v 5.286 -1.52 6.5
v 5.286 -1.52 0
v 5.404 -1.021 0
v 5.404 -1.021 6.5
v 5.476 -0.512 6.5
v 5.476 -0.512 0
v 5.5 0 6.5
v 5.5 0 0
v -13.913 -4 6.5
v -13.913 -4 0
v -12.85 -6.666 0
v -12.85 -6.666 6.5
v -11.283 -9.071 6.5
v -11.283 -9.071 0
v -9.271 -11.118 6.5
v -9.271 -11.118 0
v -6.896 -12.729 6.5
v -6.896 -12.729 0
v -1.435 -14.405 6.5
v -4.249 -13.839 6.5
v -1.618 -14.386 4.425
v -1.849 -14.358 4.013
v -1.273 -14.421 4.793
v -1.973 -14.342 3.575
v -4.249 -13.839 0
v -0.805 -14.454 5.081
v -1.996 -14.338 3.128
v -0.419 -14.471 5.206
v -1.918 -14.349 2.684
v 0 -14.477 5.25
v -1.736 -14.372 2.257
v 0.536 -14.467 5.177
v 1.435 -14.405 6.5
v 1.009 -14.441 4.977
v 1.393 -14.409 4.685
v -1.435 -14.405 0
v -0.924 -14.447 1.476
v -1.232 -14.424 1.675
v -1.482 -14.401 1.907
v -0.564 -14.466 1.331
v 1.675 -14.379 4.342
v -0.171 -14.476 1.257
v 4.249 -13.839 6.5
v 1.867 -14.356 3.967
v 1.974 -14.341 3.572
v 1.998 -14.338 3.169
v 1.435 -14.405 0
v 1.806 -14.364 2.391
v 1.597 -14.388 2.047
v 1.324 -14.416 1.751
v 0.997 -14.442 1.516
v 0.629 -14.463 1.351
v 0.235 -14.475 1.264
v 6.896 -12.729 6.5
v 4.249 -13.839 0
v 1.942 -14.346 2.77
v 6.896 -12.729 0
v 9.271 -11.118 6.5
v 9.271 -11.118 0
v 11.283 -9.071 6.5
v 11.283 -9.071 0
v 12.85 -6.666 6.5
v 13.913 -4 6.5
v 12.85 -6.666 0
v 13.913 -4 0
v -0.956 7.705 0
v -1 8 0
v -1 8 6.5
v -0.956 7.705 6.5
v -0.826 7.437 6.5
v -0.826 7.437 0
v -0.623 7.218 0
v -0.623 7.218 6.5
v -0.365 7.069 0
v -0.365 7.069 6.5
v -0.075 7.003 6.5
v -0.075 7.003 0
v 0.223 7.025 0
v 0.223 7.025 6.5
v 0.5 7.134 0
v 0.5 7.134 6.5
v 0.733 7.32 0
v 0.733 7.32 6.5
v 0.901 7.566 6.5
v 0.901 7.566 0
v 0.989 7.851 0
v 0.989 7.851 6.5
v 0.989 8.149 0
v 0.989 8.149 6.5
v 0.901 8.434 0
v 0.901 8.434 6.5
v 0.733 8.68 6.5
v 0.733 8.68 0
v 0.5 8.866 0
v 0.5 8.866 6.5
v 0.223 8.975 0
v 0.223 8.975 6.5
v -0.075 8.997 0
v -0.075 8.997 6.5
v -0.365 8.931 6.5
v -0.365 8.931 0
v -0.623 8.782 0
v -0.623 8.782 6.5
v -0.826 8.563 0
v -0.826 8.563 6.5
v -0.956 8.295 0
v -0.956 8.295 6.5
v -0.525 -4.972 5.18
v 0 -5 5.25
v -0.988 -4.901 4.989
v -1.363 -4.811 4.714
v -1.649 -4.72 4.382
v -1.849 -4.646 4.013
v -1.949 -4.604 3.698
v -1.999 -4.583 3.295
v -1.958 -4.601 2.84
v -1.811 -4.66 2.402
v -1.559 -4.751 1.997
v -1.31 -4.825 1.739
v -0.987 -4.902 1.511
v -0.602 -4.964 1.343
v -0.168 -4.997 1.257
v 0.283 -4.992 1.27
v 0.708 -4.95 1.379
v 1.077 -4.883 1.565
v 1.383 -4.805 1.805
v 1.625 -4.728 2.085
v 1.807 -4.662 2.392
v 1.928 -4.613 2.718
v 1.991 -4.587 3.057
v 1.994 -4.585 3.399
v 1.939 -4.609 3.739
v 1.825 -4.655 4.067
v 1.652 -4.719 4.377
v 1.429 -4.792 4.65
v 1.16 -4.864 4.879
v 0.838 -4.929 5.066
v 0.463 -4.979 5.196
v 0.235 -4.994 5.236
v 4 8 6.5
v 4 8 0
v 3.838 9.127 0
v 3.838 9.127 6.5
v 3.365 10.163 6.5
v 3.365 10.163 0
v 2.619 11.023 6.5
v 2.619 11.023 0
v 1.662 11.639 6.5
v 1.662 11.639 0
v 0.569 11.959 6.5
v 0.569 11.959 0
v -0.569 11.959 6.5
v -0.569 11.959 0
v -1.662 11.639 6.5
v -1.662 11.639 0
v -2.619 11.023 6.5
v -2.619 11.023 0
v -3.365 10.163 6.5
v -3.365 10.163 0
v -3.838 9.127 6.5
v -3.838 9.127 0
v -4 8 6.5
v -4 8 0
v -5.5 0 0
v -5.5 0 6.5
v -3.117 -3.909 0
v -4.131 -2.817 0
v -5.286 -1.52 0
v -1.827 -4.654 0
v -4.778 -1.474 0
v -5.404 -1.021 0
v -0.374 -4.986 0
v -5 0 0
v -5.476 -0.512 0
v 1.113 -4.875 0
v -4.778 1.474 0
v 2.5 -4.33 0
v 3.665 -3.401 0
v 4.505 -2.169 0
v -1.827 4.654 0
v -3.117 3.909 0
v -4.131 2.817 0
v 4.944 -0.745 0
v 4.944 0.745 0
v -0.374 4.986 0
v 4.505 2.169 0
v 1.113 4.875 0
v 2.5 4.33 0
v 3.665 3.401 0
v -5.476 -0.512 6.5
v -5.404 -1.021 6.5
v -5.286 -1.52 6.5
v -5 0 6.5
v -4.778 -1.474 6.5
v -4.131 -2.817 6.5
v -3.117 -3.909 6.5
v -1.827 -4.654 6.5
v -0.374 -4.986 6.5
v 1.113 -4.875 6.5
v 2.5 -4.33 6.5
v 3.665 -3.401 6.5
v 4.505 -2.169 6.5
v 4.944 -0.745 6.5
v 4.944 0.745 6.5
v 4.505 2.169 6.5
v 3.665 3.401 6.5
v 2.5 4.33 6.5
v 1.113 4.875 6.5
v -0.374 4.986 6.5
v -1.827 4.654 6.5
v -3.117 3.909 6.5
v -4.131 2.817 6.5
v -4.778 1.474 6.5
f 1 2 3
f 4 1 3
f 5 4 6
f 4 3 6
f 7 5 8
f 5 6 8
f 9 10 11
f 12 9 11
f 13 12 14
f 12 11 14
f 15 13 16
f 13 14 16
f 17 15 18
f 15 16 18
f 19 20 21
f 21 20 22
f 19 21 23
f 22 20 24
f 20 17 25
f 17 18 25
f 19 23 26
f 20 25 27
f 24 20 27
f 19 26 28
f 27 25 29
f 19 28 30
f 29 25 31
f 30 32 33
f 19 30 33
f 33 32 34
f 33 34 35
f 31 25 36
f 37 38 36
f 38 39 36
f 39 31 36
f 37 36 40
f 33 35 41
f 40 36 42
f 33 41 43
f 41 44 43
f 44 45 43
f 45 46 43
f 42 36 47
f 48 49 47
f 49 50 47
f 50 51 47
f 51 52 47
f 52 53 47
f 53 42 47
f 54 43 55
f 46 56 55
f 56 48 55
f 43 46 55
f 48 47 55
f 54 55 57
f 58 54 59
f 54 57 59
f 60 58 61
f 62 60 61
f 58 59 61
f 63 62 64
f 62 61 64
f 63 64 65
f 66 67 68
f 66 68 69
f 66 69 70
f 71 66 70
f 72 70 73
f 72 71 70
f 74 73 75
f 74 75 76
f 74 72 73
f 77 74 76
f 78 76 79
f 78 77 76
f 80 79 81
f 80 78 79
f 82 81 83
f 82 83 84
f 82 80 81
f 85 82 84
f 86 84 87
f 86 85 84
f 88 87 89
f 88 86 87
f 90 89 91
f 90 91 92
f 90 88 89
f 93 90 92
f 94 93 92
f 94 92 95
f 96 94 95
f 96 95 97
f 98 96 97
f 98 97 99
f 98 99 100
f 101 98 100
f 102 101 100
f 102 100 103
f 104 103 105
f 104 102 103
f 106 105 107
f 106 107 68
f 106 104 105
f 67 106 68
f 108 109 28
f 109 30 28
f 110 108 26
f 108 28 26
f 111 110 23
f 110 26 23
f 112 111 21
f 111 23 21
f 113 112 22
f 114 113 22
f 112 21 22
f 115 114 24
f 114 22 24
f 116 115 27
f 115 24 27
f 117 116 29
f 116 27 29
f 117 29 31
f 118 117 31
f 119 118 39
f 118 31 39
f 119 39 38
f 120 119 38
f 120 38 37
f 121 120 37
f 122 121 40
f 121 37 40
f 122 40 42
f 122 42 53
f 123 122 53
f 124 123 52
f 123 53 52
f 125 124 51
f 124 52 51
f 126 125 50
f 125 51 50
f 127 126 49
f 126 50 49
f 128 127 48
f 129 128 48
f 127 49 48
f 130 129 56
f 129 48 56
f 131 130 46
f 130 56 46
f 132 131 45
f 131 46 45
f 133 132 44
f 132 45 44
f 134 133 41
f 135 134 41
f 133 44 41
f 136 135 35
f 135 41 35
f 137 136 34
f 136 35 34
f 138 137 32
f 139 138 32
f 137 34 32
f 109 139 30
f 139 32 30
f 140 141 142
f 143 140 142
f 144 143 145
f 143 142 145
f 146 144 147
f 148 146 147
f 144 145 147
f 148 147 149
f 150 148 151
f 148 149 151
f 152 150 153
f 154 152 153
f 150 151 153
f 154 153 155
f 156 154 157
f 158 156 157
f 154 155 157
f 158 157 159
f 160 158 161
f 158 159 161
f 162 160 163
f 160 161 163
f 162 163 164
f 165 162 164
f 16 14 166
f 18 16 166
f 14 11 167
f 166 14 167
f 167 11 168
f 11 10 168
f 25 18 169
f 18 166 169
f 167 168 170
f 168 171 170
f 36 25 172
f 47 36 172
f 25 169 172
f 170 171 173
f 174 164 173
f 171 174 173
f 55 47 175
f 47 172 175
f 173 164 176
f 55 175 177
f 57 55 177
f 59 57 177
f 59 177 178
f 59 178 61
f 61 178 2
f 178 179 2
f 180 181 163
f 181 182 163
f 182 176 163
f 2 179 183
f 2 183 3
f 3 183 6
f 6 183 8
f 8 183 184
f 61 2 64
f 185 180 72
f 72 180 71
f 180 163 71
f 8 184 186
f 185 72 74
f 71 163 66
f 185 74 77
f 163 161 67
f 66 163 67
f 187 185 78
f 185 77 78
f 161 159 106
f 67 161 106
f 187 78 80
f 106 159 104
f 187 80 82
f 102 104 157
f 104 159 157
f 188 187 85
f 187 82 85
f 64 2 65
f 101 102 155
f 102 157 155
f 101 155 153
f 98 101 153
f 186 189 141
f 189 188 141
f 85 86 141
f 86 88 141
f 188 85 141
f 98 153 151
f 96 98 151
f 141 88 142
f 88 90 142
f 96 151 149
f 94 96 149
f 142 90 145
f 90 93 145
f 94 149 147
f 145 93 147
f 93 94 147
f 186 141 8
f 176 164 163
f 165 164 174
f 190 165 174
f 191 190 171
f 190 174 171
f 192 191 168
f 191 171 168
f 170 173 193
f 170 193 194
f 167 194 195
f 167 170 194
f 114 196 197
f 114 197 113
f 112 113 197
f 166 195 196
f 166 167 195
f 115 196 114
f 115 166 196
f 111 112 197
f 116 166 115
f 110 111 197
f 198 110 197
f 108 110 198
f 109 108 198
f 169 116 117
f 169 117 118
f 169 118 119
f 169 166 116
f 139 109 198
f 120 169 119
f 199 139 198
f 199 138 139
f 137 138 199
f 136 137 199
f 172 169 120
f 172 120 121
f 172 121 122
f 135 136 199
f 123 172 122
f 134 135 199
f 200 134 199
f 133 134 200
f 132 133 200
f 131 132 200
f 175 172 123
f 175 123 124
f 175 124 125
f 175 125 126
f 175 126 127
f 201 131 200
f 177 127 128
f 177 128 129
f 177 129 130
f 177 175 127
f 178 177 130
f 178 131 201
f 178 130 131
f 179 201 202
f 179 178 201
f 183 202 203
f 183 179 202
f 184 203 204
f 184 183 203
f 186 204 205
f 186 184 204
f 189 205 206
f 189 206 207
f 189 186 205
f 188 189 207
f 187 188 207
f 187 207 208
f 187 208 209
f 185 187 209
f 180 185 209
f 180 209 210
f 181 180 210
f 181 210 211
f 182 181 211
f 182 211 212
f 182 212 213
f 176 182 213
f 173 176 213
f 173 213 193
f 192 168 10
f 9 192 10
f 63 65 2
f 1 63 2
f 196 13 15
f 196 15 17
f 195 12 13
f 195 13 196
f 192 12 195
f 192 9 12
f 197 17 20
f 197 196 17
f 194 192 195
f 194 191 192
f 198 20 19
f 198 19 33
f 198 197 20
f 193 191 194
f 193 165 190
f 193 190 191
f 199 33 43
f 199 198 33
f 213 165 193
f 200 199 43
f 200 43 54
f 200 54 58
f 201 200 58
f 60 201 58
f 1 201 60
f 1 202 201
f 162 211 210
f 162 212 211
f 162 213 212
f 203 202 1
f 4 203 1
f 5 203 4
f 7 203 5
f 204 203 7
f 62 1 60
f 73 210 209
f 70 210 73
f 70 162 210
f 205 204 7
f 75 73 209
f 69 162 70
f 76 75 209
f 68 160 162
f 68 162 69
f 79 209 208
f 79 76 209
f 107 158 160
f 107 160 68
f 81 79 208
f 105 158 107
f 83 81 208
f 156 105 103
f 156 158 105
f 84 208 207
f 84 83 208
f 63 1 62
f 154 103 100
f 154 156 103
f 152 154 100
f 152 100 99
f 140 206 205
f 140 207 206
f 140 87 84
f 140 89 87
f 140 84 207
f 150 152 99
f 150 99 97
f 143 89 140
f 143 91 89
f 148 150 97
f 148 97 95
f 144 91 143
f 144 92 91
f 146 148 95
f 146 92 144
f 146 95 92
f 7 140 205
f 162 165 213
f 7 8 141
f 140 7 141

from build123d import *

# Parameters (mm, degrees)
SKETCH1_R           = 5
SKETCH1_R_2         = 1
BOSS_EXTRUDE1_DEPTH = 6.5
SKETCH5_W           = 2
SKETCH5_H           = 14.476636654


with BuildPart() as part:
    # Sketch1 → Boss-Extrude1 (new body)
    with BuildSketch(Plane.XY):
        with BuildLine():
            Line((13.913051744, -4), (5.285881411, -1.519690003))
            ThreePointArc((5.285881411, -1.519690003), (5.446207293, -0.767350063), (5.5, 0))
            Line((5.5, 0), (4, 8))
            ThreePointArc((4, 8), (0, 12), (-4, 8))
            Line((-4, 8), (-5.5, 0))
            ThreePointArc((-5.5, 0), (-5.446207293, -0.767350063), (-5.285881411, -1.519690003))
            Line((-5.285881411, -1.519690003), (-13.913051744, -4))
            ThreePointArc((-13.913051744, -4), (0, -14.476636654), (13.913051744, -4))
        make_face()
        with Locations(Location((0, 0, 0), (0, 0, 180))):
            Circle(SKETCH1_R, mode=Mode.SUBTRACT)
        with Locations(Location((0, 8, 0), (0, 0, 180))):
            Circle(SKETCH1_R_2, mode=Mode.SUBTRACT)
    extrude(amount=BOSS_EXTRUDE1_DEPTH)

    # Sketch5 → Ø4.0 (4) Diameter Hole1 (revolve, cut)
    with BuildSketch(Plane(origin=(0, 0, 3.25), x_dir=(0, 0, 1), z_dir=(1, 0, 0))):
        with Locations((1, 7.238318327)):
            Rectangle(SKETCH5_W, SKETCH5_H)
    revolve(axis=Axis((0, 6.35, 3.25), (0, -1, 0)), mode=Mode.SUBTRACT)


solid = part.part
